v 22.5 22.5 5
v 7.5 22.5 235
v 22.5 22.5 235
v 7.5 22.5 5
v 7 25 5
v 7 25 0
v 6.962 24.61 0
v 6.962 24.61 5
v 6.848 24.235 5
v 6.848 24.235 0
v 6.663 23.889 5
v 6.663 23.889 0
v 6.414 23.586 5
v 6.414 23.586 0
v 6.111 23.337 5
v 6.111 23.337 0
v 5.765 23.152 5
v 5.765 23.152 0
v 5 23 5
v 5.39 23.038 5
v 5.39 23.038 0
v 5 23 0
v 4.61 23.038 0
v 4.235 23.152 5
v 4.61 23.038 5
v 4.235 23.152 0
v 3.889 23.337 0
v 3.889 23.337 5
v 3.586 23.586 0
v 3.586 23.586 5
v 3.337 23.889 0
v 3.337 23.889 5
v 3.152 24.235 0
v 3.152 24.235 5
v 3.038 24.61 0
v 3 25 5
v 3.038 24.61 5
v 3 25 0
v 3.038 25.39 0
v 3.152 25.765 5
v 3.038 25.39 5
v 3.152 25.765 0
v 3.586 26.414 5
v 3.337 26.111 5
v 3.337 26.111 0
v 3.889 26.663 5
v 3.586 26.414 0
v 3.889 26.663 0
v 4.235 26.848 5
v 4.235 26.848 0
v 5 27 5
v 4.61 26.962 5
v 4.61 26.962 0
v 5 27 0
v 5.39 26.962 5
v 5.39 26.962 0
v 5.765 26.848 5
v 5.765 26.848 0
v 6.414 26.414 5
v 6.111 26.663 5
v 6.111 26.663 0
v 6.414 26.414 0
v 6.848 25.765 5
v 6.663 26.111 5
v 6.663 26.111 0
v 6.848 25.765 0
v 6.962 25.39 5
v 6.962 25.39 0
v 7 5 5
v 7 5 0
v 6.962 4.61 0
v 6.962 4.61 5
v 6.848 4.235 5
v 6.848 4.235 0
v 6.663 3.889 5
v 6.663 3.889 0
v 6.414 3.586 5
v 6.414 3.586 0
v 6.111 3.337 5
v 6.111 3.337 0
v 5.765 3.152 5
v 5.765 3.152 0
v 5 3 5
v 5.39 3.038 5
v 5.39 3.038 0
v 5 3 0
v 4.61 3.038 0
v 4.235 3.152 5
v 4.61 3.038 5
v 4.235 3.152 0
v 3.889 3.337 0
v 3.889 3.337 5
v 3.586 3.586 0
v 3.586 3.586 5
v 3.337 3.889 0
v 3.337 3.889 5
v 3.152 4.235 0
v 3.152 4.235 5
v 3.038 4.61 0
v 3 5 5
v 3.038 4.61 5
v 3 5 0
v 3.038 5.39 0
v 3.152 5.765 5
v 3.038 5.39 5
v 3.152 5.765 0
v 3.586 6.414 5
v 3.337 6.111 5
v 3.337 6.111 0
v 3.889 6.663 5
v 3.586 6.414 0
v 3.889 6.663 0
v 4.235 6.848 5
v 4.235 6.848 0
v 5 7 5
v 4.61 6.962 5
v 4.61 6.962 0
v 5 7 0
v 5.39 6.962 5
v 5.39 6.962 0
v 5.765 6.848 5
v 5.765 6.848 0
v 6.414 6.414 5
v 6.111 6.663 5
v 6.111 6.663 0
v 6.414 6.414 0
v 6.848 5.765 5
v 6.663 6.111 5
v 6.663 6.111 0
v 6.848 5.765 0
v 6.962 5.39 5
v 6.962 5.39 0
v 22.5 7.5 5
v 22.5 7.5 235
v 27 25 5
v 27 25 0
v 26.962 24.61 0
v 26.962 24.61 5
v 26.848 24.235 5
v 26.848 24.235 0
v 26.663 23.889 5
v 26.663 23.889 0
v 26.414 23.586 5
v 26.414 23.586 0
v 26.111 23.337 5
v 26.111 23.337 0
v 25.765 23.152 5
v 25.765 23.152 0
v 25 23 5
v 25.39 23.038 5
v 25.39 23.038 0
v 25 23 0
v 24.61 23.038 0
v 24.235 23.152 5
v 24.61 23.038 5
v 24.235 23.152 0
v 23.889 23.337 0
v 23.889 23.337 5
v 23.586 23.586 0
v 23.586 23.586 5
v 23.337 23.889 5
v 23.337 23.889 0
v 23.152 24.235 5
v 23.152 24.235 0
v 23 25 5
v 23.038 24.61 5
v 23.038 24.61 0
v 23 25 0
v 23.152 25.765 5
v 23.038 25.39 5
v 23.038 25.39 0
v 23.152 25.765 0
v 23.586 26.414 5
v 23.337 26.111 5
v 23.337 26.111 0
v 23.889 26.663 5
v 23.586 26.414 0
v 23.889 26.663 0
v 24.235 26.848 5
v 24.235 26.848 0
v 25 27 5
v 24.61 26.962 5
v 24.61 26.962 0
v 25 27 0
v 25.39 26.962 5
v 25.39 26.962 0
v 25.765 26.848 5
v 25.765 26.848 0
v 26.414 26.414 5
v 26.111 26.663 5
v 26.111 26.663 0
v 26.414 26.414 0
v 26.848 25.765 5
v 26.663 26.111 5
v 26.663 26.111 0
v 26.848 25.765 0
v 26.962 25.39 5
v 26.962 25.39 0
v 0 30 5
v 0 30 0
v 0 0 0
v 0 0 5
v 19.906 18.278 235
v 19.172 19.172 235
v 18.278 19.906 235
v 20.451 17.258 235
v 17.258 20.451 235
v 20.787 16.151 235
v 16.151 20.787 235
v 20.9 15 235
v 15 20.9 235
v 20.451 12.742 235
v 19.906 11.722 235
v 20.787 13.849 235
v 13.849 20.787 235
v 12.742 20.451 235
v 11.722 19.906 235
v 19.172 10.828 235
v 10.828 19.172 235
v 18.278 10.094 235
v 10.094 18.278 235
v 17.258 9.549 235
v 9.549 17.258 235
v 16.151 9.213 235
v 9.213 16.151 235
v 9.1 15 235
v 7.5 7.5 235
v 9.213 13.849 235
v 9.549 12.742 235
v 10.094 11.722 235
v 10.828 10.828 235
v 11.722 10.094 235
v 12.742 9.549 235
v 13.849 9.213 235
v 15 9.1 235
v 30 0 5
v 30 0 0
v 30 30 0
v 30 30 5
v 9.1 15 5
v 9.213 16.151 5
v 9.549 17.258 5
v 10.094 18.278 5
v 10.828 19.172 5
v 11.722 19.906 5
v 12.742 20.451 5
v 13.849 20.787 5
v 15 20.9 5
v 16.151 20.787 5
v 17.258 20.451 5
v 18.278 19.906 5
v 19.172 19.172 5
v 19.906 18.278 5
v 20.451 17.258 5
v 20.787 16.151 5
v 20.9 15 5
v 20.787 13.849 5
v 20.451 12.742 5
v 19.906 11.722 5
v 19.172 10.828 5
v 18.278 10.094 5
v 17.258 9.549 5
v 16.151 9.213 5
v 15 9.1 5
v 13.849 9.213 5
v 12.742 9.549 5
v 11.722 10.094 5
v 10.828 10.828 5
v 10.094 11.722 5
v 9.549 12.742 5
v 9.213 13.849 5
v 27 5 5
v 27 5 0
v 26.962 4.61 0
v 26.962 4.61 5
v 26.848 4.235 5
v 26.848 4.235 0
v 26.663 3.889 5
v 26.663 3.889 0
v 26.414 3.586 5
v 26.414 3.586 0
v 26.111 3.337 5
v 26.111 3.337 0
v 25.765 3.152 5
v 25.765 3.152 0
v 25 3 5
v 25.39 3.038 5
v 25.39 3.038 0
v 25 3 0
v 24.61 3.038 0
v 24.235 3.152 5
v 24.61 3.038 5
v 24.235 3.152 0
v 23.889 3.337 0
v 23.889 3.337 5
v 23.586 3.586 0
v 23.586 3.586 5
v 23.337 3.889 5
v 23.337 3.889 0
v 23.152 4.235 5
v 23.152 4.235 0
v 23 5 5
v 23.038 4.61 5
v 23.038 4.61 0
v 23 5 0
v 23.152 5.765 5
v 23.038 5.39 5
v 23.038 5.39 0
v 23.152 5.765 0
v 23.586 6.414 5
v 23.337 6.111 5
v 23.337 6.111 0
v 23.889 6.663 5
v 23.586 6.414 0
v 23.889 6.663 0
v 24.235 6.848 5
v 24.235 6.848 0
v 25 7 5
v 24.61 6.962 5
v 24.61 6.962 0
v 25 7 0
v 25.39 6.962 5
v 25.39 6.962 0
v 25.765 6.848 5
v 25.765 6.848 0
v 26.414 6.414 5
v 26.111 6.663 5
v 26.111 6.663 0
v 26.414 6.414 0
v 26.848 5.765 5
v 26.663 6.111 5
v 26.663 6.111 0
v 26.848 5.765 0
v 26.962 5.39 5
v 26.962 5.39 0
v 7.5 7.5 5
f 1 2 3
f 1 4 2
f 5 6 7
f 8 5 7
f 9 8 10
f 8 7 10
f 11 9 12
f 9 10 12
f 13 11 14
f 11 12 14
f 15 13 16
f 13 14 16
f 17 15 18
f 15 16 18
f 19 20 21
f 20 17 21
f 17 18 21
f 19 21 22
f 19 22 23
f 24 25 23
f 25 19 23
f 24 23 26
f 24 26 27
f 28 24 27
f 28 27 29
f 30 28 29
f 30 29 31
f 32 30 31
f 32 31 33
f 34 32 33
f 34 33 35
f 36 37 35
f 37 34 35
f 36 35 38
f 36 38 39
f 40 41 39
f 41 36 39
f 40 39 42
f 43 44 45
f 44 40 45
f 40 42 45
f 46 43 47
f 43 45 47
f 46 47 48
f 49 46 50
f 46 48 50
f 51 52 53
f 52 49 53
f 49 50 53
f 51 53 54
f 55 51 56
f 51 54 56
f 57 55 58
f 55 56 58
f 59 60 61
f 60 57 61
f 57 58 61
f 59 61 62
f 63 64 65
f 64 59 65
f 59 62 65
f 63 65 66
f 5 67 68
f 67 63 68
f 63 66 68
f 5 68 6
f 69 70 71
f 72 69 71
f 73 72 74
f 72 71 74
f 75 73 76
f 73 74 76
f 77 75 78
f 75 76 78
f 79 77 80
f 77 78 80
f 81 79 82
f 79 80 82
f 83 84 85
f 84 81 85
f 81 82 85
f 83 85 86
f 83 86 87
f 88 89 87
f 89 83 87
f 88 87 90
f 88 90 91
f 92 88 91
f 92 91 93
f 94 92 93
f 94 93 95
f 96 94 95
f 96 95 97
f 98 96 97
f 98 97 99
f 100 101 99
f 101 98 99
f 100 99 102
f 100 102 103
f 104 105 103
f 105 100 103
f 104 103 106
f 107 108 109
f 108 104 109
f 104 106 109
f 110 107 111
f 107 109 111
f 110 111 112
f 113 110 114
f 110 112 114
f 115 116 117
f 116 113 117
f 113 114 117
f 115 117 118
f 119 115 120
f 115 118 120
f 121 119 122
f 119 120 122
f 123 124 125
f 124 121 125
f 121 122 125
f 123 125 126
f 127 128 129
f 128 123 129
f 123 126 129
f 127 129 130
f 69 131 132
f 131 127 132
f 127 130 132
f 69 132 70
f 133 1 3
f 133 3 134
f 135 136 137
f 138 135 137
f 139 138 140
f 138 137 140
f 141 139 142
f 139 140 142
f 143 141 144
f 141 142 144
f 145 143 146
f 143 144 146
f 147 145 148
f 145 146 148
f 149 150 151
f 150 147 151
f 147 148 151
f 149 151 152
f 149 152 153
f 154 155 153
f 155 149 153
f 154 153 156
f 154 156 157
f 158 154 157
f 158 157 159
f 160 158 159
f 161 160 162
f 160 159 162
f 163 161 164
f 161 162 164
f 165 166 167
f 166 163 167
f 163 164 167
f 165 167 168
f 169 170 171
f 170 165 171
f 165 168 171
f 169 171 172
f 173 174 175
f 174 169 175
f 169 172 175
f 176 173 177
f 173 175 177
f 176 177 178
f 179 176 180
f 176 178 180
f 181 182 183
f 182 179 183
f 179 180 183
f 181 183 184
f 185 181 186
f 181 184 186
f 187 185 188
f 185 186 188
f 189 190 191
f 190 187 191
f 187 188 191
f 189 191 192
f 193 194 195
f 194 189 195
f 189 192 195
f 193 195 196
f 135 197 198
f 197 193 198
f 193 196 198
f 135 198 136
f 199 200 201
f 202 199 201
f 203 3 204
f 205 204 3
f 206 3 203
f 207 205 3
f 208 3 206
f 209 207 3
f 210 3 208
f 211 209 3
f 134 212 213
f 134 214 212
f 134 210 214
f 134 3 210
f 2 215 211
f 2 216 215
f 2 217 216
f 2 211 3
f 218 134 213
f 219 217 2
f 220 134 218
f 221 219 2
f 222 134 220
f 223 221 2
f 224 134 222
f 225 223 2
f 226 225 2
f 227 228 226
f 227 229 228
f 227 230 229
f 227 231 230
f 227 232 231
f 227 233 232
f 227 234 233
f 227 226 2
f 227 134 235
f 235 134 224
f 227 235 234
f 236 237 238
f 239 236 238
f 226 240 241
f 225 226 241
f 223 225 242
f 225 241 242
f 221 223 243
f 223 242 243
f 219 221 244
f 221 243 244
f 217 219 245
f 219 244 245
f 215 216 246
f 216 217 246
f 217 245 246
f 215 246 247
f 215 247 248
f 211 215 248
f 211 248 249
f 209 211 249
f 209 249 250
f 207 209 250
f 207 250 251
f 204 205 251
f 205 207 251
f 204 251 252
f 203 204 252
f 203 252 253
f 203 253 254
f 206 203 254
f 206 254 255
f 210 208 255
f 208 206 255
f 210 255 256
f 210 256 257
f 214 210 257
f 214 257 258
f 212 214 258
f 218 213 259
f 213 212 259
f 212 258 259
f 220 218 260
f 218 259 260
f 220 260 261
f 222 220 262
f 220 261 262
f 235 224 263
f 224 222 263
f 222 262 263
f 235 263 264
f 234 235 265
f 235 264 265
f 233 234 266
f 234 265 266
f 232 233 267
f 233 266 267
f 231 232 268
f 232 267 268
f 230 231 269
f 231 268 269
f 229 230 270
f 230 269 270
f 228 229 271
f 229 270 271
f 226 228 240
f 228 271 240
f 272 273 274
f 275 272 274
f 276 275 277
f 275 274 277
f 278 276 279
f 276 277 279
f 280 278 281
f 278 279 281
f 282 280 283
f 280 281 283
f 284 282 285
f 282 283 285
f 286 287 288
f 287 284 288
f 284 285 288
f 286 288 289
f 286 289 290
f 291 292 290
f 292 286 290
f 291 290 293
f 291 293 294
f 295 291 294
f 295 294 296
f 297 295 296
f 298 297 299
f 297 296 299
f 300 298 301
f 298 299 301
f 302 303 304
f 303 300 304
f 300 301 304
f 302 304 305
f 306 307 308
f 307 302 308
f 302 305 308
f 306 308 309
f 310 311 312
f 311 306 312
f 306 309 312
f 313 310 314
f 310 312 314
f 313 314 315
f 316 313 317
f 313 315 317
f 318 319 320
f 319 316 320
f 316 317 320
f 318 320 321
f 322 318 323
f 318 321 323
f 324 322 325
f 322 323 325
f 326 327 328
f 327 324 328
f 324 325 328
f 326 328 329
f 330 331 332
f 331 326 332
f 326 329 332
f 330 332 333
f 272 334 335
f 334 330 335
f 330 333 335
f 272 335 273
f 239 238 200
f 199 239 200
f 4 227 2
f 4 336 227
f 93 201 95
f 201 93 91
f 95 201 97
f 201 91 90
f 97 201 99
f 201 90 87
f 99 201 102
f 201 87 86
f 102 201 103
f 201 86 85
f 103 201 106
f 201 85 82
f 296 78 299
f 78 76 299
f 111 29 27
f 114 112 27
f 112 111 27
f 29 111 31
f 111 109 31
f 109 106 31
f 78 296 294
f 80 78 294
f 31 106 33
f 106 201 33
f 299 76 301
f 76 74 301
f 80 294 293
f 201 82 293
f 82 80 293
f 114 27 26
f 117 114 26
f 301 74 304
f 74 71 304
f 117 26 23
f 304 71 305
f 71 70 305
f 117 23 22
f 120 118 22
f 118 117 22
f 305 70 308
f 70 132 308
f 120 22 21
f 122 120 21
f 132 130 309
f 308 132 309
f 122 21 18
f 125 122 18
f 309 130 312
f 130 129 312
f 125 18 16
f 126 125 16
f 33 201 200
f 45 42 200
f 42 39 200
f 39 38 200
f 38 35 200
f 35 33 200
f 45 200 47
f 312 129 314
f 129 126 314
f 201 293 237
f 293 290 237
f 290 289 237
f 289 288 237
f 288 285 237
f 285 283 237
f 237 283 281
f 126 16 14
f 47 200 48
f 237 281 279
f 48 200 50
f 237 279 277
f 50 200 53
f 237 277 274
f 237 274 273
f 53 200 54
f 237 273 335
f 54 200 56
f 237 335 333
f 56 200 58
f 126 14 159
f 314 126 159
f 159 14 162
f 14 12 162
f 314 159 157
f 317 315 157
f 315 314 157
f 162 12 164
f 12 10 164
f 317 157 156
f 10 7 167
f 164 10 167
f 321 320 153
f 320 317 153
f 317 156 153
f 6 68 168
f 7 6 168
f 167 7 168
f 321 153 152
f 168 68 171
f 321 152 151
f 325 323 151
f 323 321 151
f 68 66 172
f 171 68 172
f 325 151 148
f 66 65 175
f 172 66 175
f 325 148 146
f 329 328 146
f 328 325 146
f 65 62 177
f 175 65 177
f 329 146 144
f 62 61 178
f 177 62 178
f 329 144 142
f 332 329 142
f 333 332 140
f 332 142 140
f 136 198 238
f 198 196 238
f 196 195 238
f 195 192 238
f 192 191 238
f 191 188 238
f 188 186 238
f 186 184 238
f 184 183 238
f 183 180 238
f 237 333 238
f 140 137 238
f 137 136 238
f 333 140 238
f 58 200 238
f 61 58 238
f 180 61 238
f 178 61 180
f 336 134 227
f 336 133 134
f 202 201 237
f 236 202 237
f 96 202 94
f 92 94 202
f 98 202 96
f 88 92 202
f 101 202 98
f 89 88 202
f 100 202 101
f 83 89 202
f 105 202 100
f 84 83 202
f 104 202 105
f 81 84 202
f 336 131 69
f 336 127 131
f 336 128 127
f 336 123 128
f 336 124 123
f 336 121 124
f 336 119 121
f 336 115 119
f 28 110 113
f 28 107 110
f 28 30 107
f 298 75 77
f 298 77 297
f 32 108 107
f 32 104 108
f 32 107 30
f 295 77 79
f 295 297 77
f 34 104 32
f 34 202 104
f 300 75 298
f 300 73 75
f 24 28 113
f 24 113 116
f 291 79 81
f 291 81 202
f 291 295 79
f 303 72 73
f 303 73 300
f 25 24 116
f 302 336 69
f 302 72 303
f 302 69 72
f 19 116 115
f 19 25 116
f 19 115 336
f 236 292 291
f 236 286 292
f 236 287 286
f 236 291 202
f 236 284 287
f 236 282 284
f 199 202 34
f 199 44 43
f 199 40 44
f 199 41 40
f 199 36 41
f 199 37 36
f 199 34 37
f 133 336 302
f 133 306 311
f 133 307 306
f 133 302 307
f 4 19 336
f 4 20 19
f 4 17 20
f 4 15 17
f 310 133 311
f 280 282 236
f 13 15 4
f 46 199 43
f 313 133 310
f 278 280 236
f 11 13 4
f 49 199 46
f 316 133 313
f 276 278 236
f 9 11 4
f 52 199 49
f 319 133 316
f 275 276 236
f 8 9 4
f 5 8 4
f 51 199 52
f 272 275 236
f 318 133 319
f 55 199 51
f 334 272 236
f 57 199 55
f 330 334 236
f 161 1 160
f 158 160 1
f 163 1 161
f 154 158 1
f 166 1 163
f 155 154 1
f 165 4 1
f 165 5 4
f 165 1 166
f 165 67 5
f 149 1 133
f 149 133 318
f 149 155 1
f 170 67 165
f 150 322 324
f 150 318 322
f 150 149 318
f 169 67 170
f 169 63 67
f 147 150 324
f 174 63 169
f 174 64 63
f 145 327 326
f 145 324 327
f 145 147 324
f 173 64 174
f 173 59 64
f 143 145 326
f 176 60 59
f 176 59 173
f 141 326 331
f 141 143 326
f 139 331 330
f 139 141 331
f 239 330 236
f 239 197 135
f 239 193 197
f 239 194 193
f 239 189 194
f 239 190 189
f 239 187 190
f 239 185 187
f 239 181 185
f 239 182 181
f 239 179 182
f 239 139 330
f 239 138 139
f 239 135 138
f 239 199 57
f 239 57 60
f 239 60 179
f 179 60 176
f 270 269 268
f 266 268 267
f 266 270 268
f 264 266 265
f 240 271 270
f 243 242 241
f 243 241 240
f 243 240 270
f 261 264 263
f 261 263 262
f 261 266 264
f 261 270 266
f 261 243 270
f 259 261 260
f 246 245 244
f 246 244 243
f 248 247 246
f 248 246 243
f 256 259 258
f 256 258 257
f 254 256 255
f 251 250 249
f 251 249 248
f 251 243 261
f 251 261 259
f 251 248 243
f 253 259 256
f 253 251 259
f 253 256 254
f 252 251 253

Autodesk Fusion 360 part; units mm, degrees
sketch "Sketch1" plane through (0, 0, 0) normal (0, 0, 1) x (1, 0, 0) in component "Holder"
  line L0 (0, 0) -> (30, 0)
  line L1 (30, 0) -> (30, 30)
  line L2 (30, 30) -> (0, 30)
  line L3 (0, 30) -> (0, 0)
  circle A0 centre (5, 25) radius 2
  circle A1 centre (5, 5) radius 2
  circle A2 centre (25, 25) radius 2
  circle A3 centre (25, 5) radius 2
  dimension "d1" = 30
  dimension "d2" = 30
  dimension "d4" = 4
  dimension "d5" = 4
  dimension "d6" = 20
  dimension "d7" = 5
  dimension "d8" = 5
  dimension "d9" = 4
  dimension "d10" = 20
  dimension "d11" = 5
  dimension "d12" = 4
  dimension "d13" = 20
  dimension "d14" = 20
extrude "Extrude1" add sketch "Sketch1" along normal blind 5 in component "Holder"
sketch "Sketch2" plane through (0, 0, 5) normal (0, 0, 1) x (-1, 0, 0) in component "Holder"
  circle A0 centre (-5, -5) radius 2
  circle A1 centre (-25, -5) radius 2
  circle A2 centre (-5, -25) radius 2
  circle A3 centre (-25, -25) radius 2
  line L0 (0, -30) -> (0, 0)
  line L1 (0, 0) -> (-30, 0)
  line L2 (-30, 0) -> (-30, -30)
  line L3 (-30, -30) -> (0, -30)
  line L4 (-7.5, -22.5) -> (-22.5, -22.5)
  line L5 (-22.5, -22.5) -> (-22.5, -7.5)
  line L6 (-22.5, -7.5) -> (-7.5, -7.5)
  line L7 (-7.5, -7.5) -> (-7.5, -22.5)
  circle A4 centre (-15, -15) radius 5.9
  dimension "d17" = 15
  dimension "d18" = 15
  dimension "d19" = 7.5
  dimension "d20" = 7.5
  dimension "d21" = 11.8
  dimension "d22" = 15
extrude "Extrude2" add sketch "Sketch2" along normal blind 30 contours L4 L5 L6 L7 in component "Holder"
extrude "Extrude3" add 1 faces at (15.147, 8.0388, 35) along direction (0, 0, 1) blind 2 in component "Holder"
extrude "Extrude4" add 1 faces at (15.147, 8.0388, 37) along direction (0, 0, 1) blind 18 in component "Holder"
extrude "Extrude5" add 1 faces at (15.147, 8.0388, 55) along direction (0, 0, 1) blind 180 in component "Holder"
component "Holder" placed x (1, 0, 0) y (0, 1, 0) z (0, 0, 1) at (0, 0, 0)
